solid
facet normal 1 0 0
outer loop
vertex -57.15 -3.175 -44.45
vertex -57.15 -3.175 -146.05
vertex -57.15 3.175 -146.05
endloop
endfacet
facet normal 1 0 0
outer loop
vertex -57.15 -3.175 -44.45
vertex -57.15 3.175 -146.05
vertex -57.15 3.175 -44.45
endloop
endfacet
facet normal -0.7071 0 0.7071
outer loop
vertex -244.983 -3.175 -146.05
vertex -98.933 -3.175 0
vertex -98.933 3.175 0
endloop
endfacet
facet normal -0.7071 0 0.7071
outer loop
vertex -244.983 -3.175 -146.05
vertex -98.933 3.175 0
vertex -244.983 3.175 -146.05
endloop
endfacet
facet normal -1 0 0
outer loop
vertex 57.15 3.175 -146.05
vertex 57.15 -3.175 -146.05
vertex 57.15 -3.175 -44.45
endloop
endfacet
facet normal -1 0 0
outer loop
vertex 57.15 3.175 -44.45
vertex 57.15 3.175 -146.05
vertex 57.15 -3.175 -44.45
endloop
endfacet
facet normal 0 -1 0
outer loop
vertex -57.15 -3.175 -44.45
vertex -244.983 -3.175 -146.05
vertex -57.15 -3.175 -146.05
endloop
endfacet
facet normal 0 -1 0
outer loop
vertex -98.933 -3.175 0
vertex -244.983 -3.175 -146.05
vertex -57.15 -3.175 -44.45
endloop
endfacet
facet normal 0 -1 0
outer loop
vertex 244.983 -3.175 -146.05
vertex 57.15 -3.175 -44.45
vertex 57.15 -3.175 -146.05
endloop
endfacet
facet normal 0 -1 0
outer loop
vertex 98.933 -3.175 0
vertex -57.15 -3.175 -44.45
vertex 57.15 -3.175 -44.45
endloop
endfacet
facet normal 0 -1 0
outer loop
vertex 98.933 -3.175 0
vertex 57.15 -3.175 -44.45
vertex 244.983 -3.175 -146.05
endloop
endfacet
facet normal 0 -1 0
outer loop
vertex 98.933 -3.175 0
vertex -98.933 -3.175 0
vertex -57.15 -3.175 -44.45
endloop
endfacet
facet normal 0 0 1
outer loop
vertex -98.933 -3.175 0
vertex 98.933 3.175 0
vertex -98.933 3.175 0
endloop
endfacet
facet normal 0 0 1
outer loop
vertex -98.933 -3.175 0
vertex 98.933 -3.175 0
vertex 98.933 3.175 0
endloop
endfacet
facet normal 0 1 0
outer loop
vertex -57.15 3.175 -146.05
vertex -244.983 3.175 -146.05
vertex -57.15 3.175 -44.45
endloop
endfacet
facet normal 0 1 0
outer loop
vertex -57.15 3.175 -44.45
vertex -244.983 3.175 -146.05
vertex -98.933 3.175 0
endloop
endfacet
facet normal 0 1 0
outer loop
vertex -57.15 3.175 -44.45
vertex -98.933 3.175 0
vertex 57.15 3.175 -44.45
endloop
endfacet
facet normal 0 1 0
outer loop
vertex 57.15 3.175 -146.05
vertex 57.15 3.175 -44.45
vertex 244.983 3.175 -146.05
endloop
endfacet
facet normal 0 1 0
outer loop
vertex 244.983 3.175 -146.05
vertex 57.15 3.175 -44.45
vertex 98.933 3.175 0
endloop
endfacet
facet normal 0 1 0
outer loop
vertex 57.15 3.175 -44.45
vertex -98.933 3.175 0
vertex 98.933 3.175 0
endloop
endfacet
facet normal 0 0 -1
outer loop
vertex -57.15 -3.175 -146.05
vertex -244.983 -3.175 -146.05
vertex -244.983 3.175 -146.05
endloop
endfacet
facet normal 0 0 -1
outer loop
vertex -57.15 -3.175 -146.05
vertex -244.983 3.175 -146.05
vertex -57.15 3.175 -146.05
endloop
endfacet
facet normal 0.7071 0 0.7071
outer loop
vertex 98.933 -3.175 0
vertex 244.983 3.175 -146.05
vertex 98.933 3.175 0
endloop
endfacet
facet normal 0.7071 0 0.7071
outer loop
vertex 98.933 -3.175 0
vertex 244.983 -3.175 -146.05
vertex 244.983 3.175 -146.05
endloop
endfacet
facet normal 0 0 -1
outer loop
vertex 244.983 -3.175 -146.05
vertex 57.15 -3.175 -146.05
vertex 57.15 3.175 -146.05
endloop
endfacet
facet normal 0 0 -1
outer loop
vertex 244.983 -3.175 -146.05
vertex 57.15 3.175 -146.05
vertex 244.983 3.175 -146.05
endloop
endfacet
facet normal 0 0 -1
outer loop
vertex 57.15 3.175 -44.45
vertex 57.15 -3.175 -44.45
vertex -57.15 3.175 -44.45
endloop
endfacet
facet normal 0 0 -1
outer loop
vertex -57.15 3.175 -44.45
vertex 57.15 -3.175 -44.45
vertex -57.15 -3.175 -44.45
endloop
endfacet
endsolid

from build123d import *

# Parameters (mm, degrees)
F1_DEPTH = 3.175
F2_W     = 57.15
F2_H     = 101.6
F3_DEPTH = 6.351


with BuildPart() as f1:
    # F0 (on Front) → F1 (new body, symmetric)
    with BuildSketch(Plane.XZ):
        Polygon((98.933, 0), (-98.933, 0), (-244.983, -146.05), (244.983, -146.05), align=None)
    extrude(amount=F1_DEPTH, both=True)

    # F2 (on face) → F3 (cut, through all)
    with BuildSketch(Plane.XZ.offset(3.175)):
        with Locations((28.575, -95.25)):
            Rectangle(F2_W, F2_H)
        with Locations((-28.575, -95.25)):
            Rectangle(F2_W, F2_H)
    extrude(amount=-F3_DEPTH, mode=Mode.SUBTRACT)


solid = f1.part
